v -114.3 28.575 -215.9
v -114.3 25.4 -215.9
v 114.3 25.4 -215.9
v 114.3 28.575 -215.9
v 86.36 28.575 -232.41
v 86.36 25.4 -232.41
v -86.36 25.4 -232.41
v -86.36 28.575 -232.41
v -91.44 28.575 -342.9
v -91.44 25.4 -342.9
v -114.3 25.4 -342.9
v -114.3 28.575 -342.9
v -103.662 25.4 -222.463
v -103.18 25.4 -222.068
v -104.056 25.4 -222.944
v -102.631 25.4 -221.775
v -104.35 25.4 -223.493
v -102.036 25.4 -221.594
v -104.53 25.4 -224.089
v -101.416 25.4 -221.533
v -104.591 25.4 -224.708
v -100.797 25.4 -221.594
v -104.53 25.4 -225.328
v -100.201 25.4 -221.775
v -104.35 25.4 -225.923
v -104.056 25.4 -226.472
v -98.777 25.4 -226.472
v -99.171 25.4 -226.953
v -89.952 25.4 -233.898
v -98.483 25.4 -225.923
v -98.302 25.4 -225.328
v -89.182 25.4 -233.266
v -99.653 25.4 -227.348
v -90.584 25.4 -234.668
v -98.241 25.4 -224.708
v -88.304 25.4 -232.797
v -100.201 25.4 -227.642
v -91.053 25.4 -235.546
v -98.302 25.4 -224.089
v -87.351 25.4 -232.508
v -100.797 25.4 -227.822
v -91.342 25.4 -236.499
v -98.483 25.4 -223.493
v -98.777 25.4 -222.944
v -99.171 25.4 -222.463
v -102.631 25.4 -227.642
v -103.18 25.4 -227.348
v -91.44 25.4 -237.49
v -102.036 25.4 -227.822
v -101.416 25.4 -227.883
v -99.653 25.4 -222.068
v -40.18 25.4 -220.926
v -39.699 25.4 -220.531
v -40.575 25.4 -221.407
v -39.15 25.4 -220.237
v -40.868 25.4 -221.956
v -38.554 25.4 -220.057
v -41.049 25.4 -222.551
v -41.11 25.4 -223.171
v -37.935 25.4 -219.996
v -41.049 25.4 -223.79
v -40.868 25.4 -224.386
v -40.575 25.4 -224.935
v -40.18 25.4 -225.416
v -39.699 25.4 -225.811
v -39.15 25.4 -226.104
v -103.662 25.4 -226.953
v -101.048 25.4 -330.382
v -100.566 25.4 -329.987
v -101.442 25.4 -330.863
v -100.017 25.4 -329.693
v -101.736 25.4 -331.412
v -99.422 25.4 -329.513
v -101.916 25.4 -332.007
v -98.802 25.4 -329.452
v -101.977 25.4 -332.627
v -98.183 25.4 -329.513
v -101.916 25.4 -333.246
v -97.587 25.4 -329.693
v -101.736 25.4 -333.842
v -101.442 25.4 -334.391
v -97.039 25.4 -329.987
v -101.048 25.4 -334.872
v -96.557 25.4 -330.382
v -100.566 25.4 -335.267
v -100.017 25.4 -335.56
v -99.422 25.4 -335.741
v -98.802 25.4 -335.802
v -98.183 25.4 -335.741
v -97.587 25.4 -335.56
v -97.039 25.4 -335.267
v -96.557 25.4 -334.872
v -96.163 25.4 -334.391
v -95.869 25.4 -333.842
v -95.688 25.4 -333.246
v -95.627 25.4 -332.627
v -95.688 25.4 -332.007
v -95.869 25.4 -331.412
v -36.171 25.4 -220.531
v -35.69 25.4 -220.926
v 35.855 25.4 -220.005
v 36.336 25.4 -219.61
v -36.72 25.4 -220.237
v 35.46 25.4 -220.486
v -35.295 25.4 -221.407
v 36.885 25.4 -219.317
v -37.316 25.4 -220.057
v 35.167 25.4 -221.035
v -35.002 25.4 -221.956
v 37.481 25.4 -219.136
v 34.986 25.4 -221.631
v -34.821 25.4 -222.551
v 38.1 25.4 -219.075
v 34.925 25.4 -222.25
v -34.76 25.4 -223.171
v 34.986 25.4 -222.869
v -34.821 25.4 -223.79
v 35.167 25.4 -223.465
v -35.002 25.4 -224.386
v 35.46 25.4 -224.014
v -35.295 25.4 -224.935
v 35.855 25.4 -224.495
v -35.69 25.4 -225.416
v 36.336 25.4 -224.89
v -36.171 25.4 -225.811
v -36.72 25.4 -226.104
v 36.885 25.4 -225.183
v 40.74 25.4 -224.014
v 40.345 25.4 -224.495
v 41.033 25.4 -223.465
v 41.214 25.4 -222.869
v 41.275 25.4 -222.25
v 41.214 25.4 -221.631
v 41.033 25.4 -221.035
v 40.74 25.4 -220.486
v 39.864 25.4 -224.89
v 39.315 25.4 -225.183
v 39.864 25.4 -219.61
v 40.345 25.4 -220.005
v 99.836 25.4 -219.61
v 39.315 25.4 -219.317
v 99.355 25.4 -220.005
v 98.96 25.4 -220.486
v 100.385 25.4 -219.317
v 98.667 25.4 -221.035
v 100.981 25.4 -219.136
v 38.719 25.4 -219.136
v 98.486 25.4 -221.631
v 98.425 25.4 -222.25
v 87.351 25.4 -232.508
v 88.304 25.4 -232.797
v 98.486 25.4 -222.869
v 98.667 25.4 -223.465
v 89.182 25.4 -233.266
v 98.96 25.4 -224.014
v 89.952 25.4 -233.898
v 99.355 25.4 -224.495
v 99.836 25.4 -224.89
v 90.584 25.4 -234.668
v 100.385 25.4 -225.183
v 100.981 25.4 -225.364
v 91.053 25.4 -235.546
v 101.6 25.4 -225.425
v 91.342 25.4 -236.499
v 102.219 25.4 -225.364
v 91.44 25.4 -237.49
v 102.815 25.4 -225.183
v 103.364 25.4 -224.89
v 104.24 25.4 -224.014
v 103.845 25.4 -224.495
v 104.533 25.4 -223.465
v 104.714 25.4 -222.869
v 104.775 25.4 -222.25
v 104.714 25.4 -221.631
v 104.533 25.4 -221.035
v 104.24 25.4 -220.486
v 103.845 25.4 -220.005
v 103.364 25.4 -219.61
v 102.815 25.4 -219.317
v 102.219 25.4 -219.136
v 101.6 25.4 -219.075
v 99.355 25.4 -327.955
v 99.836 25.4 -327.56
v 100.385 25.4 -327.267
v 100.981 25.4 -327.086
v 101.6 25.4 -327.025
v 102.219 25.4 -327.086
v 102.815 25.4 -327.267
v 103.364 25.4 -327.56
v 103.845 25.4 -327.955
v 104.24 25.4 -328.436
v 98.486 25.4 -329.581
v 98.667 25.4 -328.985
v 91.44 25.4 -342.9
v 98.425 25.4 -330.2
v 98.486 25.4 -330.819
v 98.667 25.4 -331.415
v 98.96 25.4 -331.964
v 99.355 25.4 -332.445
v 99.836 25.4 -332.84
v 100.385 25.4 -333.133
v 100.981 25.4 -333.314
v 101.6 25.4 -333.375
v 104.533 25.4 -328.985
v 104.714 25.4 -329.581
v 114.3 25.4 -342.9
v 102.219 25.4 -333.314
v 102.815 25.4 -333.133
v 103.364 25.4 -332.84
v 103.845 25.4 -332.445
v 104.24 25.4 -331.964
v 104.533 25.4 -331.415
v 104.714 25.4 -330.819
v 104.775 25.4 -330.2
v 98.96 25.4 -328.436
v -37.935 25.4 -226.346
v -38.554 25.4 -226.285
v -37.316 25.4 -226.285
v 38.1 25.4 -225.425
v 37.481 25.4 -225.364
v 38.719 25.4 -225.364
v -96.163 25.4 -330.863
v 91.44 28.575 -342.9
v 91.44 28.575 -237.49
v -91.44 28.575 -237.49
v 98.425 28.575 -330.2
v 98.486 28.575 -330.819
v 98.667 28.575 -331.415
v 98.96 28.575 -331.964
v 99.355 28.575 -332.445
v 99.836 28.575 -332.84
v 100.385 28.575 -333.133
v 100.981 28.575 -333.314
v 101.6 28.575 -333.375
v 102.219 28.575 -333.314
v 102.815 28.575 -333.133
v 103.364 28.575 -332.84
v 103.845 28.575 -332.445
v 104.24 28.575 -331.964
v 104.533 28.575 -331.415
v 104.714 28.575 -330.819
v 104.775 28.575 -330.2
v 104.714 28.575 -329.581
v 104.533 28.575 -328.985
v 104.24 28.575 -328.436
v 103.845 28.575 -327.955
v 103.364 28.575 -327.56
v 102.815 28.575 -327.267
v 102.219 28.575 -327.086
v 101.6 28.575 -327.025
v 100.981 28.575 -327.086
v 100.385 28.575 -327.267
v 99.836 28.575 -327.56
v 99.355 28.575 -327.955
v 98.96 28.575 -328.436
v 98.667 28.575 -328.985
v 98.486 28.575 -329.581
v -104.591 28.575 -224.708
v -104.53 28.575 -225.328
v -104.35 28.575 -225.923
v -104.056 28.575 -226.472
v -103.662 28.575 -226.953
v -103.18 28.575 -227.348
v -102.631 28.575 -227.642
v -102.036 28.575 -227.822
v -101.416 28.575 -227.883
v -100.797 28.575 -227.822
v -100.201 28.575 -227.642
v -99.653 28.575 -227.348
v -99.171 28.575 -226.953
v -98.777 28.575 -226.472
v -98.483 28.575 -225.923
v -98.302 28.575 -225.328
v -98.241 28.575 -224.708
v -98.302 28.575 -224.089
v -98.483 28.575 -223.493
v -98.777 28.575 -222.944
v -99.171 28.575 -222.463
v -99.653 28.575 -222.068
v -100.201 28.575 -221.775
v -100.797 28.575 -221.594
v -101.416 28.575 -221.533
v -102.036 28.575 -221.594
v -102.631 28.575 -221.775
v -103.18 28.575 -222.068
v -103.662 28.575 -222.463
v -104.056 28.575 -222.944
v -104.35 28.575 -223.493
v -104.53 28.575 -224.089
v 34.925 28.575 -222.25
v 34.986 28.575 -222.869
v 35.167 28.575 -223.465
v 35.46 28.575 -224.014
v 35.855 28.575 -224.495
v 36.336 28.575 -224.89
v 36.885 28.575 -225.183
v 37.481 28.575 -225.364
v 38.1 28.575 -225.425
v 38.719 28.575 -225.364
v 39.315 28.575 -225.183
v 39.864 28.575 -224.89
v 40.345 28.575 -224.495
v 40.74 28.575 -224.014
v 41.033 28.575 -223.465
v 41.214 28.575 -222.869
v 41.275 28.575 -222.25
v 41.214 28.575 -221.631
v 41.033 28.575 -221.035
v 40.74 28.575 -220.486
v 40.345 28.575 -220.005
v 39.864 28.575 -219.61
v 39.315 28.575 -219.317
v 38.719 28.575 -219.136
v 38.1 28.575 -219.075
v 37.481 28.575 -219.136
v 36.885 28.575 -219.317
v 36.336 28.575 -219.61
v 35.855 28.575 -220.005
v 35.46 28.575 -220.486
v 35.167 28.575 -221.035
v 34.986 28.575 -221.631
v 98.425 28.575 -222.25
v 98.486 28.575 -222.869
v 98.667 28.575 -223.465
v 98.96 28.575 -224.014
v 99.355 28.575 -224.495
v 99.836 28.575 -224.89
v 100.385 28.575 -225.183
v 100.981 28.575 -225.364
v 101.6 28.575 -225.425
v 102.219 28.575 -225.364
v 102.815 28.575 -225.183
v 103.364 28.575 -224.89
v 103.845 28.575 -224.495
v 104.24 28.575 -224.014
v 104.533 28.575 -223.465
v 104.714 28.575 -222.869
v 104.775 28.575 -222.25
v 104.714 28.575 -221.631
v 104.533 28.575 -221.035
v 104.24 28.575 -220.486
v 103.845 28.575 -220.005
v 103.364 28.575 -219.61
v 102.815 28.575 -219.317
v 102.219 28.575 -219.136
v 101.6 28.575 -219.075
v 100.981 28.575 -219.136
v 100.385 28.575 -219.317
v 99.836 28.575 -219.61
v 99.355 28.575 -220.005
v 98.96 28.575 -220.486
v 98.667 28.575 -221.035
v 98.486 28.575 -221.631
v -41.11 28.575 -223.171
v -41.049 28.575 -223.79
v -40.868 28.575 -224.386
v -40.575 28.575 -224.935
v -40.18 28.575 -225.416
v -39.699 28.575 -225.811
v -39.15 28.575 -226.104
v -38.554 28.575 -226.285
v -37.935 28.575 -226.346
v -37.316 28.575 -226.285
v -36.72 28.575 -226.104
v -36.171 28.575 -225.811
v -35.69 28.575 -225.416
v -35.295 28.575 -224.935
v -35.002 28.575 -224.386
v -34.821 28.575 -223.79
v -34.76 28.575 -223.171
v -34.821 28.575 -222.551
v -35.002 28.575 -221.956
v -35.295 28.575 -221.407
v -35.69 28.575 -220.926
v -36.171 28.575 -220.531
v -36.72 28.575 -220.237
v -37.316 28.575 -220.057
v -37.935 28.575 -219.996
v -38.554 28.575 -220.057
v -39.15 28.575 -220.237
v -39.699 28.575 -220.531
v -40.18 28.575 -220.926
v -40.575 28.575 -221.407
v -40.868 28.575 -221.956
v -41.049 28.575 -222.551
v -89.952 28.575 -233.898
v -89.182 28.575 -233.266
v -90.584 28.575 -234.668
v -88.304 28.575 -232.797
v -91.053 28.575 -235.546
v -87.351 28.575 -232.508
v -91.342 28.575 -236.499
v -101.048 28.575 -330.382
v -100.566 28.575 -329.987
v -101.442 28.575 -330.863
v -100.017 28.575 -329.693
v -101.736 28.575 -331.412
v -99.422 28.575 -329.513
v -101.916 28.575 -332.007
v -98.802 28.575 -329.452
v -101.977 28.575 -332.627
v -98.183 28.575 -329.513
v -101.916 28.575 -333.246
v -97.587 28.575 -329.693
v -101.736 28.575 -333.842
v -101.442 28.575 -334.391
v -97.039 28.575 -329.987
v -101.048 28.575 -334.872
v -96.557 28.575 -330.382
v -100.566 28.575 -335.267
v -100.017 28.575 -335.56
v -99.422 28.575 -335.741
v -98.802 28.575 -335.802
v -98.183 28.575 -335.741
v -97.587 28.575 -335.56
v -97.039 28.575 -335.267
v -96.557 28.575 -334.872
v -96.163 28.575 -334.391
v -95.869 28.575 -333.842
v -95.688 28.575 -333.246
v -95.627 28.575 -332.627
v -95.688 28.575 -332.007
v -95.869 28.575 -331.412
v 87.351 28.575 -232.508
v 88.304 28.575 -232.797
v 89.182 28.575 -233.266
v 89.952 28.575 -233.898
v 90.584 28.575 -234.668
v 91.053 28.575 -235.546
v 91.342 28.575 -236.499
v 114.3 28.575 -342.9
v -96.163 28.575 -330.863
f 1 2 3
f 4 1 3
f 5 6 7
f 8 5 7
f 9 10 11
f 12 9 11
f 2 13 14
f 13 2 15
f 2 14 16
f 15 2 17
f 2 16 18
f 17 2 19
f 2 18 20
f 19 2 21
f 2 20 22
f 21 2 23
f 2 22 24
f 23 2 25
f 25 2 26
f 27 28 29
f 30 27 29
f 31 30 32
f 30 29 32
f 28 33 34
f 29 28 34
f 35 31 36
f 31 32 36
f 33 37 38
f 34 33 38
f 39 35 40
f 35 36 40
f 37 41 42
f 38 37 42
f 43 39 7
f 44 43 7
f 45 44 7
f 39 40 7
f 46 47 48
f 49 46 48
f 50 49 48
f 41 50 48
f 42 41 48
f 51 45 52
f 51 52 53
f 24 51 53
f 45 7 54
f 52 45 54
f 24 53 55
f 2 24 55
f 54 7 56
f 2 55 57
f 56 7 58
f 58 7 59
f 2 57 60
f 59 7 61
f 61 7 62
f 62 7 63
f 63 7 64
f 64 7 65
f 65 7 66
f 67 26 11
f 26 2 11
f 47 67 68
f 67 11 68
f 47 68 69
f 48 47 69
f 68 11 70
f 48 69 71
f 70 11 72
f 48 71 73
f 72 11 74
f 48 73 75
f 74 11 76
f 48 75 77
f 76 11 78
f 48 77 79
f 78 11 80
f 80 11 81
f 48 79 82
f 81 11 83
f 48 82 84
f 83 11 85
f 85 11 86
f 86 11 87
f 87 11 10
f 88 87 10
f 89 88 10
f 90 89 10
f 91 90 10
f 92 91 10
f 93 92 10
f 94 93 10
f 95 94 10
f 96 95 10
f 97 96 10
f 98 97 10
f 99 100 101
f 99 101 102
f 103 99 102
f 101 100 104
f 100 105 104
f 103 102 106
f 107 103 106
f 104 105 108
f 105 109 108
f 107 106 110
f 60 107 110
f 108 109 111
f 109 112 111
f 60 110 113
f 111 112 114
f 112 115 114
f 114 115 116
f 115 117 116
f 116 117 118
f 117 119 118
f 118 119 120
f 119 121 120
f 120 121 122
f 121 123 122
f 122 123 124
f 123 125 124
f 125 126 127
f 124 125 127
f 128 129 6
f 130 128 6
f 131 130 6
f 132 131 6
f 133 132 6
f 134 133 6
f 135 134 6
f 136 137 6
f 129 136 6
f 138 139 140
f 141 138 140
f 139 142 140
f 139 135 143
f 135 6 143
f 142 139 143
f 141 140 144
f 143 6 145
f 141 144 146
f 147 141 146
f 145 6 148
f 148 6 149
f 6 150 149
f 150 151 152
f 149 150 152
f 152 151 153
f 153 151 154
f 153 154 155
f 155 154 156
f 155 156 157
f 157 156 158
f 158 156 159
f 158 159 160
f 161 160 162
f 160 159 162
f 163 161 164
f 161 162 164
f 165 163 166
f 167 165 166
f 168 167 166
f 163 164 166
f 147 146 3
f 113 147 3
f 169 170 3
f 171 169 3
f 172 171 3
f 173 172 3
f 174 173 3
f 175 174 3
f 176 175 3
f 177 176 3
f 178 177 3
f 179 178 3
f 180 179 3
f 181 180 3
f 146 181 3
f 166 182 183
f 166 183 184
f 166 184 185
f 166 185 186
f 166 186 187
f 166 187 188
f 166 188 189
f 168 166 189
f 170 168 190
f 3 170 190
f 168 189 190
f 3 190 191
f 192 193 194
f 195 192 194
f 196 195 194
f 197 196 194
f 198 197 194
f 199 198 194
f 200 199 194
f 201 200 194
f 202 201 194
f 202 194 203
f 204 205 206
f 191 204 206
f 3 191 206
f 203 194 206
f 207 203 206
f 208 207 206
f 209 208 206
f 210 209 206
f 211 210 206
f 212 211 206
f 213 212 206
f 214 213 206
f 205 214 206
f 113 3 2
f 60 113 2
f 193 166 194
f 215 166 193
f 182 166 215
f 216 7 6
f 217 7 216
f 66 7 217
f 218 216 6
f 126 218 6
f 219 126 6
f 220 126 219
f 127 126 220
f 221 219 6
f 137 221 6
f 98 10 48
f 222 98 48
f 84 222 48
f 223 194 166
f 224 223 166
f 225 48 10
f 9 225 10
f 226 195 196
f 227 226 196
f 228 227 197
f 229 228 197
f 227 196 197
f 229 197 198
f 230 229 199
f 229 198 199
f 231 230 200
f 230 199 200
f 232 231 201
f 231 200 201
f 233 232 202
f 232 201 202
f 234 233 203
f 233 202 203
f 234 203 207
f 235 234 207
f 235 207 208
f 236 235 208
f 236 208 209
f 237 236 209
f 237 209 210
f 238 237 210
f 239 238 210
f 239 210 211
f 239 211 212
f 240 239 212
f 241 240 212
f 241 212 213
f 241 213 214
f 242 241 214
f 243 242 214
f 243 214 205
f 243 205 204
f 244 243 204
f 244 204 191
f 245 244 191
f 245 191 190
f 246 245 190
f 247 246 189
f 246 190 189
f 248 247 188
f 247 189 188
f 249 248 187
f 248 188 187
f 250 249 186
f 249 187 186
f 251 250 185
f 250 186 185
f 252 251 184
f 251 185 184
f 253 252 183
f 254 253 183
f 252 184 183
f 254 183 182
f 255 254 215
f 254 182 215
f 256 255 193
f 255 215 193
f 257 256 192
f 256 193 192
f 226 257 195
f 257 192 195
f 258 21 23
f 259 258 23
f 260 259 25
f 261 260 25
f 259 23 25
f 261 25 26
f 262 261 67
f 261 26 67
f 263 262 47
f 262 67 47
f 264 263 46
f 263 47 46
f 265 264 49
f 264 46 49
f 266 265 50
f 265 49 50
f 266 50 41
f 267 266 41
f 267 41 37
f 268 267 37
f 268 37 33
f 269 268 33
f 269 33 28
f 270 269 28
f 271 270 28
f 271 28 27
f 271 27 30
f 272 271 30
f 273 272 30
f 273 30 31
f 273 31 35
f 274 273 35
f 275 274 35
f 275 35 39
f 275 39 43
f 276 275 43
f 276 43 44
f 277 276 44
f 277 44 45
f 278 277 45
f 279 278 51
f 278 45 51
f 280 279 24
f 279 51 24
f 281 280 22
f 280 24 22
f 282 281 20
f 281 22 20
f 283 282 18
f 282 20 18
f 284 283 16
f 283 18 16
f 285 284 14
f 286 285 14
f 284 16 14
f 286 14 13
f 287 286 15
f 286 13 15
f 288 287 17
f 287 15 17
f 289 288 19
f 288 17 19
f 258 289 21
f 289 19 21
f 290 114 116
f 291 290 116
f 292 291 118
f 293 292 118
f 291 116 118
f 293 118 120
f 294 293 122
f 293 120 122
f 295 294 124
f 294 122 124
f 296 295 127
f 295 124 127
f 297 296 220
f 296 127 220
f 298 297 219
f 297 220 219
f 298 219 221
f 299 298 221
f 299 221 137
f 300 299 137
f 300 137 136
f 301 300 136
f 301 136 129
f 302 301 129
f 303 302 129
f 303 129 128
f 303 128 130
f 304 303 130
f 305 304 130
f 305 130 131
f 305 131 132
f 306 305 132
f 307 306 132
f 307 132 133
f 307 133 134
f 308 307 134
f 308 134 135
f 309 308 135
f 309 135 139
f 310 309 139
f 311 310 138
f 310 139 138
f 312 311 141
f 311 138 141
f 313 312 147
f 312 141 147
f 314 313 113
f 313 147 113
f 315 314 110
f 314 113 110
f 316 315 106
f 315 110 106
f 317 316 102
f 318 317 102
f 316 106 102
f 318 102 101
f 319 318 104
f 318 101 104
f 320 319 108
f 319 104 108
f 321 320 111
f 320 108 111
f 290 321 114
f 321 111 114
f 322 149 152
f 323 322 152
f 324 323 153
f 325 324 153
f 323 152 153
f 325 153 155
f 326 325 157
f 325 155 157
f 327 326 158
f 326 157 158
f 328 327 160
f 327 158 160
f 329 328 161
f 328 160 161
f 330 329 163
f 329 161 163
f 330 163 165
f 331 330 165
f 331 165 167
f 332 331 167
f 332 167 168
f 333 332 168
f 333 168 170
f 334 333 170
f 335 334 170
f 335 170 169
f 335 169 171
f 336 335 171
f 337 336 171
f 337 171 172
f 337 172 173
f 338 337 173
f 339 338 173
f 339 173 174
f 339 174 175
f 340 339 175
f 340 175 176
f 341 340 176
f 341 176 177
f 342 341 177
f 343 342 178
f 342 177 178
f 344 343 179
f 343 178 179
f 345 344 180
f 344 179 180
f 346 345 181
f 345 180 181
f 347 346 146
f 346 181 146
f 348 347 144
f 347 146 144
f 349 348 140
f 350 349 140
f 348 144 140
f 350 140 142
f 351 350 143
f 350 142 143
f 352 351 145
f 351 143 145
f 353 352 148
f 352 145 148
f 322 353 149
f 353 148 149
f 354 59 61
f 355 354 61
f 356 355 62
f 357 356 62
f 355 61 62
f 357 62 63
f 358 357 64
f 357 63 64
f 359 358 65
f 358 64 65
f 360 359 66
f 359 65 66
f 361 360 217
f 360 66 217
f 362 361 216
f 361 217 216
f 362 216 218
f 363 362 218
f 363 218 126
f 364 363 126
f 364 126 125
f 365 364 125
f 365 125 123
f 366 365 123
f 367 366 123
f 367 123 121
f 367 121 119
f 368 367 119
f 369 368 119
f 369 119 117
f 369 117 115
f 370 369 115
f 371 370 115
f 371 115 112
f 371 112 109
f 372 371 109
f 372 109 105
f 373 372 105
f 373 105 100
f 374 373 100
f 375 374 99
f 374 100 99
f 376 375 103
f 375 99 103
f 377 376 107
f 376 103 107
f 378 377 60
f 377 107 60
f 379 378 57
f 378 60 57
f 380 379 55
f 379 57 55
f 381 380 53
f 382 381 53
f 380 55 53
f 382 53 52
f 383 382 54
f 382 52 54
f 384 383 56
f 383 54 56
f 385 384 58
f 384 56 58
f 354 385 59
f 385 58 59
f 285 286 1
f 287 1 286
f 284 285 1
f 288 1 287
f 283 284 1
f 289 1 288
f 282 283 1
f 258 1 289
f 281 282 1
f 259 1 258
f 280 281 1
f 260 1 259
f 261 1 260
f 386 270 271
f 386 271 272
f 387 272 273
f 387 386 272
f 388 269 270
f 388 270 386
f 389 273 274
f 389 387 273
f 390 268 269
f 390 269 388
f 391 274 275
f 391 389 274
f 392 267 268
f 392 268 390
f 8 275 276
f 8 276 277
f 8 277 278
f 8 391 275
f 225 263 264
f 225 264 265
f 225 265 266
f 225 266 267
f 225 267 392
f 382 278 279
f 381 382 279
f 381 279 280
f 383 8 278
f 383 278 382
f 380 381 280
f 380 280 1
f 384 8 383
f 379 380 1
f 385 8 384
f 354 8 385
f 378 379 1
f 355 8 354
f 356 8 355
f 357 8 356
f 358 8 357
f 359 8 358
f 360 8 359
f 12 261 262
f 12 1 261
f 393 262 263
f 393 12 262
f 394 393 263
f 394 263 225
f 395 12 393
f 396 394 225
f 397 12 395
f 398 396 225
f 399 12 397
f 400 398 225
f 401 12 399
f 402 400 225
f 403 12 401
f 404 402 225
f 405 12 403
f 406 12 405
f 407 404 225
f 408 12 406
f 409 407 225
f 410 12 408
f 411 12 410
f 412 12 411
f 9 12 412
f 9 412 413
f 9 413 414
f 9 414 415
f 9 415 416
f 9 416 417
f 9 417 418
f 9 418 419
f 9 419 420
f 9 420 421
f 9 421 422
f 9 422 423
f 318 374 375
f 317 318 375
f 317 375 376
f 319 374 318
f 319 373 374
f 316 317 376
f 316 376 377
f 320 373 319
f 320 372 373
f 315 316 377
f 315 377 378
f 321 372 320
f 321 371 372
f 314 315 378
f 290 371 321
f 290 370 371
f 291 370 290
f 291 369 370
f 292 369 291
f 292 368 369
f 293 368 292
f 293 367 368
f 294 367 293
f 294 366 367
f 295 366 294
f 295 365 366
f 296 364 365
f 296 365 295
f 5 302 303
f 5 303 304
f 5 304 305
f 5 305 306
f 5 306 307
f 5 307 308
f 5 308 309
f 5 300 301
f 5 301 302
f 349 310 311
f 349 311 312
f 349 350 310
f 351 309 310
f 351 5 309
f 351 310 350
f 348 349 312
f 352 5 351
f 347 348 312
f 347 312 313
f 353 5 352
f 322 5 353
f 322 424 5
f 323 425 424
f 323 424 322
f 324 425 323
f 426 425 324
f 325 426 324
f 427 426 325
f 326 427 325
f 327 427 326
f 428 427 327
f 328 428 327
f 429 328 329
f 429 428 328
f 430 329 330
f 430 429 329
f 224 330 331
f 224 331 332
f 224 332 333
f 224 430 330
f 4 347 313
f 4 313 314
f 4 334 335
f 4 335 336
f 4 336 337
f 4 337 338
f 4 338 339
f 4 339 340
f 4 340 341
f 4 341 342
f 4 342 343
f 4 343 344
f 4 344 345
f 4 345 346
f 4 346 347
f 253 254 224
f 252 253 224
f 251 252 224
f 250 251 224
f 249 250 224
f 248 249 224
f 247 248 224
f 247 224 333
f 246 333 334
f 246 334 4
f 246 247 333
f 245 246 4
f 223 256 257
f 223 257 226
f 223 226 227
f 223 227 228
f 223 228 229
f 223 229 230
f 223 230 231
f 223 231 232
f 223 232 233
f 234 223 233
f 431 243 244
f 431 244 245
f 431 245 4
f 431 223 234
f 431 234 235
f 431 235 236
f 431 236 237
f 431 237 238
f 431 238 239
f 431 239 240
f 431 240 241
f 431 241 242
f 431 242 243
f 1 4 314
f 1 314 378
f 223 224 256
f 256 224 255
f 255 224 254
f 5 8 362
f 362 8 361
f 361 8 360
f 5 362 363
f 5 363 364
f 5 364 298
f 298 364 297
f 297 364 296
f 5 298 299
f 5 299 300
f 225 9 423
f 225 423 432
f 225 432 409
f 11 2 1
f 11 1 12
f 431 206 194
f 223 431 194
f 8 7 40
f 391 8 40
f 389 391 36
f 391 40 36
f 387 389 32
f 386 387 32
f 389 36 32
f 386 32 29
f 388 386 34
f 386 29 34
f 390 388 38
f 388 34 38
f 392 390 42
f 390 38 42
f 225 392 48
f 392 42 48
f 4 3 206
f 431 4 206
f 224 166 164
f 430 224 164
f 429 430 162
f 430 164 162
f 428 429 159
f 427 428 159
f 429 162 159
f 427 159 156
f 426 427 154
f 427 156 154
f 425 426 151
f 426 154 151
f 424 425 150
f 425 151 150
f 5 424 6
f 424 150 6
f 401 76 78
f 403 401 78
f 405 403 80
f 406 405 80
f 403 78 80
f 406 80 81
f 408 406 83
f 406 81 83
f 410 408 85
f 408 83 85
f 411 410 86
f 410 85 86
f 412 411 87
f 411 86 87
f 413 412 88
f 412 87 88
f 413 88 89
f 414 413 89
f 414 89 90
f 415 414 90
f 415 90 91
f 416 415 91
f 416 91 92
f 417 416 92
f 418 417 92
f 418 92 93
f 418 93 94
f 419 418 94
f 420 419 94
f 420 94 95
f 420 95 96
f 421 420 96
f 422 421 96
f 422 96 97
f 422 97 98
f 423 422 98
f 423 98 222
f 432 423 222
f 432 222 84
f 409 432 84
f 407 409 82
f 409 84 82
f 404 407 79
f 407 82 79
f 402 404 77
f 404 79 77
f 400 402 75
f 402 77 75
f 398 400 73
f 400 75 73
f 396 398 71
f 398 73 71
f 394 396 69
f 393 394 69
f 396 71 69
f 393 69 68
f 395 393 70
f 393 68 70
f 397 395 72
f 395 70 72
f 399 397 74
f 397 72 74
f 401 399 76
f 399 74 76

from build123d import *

# Parameters (mm, degrees)
SKETCH1_W                   = 12.7
SKETCH1_H                   = 127
BOSS_EXTRUDE1_DEPTH         = 3.175
F_1_4_0_25_DIAMETER_HOLE1_D = 6.35


with BuildPart() as part:
    # Sketch1 → Boss-Extrude1 (new body)
    with BuildSketch(Plane(origin=(0, 25.4, 0), x_dir=(1, 0, 0), z_dir=(0, 1, 0))):
        with BuildLine():
            Line((-91.44, 342.9), (-101.6, 342.9))
            Line((-101.6, 342.9), (-101.6, 215.9))
            Line((-101.6, 215.9), (98.425, 215.9))
            Line((98.425, 215.9), (101.6, 215.9))
            Line((101.6, 215.9), (101.6, 342.9))
            Line((101.6, 342.9), (91.44, 342.9))
            Line((91.44, 342.9), (91.44, 308.61))
            Line((91.44, 308.61), (91.44, 237.49))
            ThreePointArc((91.44, 237.49), (89.952102448, 233.897897552), (86.36, 232.41))
            Line((86.36, 232.41), (-86.36, 232.41))
            ThreePointArc((-86.36, 232.41), (-89.952102448, 233.897897552), (-91.44, 237.49))
            Line((-91.44, 237.49), (-91.44, 308.61))
            Line((-91.44, 308.61), (-91.44, 342.9))
        make_face()
        with Locations((-107.95, 279.4)):
            Rectangle(SKETCH1_W, SKETCH1_H)
        with Locations((107.95, 279.4)):
            Rectangle(SKETCH1_W, SKETCH1_H)
    extrude(amount=BOSS_EXTRUDE1_DEPTH)

    # 1/4 (0.25) Diameter Hole1 (through all)
    with Locations(Plane(origin=(0, 28.575, 0), x_dir=(1, 0, 0), z_dir=(0, 1, 0))):
        with Locations((101.6, 330.2), (101.6, 222.25), (38.1, 222.25), (-98.802463558, 332.626703007), (-101.416445229, 224.708356097), (-37.935064693, 223.17071982)):
            Hole(F_1_4_0_25_DIAMETER_HOLE1_D / 2)


solid = part.part
